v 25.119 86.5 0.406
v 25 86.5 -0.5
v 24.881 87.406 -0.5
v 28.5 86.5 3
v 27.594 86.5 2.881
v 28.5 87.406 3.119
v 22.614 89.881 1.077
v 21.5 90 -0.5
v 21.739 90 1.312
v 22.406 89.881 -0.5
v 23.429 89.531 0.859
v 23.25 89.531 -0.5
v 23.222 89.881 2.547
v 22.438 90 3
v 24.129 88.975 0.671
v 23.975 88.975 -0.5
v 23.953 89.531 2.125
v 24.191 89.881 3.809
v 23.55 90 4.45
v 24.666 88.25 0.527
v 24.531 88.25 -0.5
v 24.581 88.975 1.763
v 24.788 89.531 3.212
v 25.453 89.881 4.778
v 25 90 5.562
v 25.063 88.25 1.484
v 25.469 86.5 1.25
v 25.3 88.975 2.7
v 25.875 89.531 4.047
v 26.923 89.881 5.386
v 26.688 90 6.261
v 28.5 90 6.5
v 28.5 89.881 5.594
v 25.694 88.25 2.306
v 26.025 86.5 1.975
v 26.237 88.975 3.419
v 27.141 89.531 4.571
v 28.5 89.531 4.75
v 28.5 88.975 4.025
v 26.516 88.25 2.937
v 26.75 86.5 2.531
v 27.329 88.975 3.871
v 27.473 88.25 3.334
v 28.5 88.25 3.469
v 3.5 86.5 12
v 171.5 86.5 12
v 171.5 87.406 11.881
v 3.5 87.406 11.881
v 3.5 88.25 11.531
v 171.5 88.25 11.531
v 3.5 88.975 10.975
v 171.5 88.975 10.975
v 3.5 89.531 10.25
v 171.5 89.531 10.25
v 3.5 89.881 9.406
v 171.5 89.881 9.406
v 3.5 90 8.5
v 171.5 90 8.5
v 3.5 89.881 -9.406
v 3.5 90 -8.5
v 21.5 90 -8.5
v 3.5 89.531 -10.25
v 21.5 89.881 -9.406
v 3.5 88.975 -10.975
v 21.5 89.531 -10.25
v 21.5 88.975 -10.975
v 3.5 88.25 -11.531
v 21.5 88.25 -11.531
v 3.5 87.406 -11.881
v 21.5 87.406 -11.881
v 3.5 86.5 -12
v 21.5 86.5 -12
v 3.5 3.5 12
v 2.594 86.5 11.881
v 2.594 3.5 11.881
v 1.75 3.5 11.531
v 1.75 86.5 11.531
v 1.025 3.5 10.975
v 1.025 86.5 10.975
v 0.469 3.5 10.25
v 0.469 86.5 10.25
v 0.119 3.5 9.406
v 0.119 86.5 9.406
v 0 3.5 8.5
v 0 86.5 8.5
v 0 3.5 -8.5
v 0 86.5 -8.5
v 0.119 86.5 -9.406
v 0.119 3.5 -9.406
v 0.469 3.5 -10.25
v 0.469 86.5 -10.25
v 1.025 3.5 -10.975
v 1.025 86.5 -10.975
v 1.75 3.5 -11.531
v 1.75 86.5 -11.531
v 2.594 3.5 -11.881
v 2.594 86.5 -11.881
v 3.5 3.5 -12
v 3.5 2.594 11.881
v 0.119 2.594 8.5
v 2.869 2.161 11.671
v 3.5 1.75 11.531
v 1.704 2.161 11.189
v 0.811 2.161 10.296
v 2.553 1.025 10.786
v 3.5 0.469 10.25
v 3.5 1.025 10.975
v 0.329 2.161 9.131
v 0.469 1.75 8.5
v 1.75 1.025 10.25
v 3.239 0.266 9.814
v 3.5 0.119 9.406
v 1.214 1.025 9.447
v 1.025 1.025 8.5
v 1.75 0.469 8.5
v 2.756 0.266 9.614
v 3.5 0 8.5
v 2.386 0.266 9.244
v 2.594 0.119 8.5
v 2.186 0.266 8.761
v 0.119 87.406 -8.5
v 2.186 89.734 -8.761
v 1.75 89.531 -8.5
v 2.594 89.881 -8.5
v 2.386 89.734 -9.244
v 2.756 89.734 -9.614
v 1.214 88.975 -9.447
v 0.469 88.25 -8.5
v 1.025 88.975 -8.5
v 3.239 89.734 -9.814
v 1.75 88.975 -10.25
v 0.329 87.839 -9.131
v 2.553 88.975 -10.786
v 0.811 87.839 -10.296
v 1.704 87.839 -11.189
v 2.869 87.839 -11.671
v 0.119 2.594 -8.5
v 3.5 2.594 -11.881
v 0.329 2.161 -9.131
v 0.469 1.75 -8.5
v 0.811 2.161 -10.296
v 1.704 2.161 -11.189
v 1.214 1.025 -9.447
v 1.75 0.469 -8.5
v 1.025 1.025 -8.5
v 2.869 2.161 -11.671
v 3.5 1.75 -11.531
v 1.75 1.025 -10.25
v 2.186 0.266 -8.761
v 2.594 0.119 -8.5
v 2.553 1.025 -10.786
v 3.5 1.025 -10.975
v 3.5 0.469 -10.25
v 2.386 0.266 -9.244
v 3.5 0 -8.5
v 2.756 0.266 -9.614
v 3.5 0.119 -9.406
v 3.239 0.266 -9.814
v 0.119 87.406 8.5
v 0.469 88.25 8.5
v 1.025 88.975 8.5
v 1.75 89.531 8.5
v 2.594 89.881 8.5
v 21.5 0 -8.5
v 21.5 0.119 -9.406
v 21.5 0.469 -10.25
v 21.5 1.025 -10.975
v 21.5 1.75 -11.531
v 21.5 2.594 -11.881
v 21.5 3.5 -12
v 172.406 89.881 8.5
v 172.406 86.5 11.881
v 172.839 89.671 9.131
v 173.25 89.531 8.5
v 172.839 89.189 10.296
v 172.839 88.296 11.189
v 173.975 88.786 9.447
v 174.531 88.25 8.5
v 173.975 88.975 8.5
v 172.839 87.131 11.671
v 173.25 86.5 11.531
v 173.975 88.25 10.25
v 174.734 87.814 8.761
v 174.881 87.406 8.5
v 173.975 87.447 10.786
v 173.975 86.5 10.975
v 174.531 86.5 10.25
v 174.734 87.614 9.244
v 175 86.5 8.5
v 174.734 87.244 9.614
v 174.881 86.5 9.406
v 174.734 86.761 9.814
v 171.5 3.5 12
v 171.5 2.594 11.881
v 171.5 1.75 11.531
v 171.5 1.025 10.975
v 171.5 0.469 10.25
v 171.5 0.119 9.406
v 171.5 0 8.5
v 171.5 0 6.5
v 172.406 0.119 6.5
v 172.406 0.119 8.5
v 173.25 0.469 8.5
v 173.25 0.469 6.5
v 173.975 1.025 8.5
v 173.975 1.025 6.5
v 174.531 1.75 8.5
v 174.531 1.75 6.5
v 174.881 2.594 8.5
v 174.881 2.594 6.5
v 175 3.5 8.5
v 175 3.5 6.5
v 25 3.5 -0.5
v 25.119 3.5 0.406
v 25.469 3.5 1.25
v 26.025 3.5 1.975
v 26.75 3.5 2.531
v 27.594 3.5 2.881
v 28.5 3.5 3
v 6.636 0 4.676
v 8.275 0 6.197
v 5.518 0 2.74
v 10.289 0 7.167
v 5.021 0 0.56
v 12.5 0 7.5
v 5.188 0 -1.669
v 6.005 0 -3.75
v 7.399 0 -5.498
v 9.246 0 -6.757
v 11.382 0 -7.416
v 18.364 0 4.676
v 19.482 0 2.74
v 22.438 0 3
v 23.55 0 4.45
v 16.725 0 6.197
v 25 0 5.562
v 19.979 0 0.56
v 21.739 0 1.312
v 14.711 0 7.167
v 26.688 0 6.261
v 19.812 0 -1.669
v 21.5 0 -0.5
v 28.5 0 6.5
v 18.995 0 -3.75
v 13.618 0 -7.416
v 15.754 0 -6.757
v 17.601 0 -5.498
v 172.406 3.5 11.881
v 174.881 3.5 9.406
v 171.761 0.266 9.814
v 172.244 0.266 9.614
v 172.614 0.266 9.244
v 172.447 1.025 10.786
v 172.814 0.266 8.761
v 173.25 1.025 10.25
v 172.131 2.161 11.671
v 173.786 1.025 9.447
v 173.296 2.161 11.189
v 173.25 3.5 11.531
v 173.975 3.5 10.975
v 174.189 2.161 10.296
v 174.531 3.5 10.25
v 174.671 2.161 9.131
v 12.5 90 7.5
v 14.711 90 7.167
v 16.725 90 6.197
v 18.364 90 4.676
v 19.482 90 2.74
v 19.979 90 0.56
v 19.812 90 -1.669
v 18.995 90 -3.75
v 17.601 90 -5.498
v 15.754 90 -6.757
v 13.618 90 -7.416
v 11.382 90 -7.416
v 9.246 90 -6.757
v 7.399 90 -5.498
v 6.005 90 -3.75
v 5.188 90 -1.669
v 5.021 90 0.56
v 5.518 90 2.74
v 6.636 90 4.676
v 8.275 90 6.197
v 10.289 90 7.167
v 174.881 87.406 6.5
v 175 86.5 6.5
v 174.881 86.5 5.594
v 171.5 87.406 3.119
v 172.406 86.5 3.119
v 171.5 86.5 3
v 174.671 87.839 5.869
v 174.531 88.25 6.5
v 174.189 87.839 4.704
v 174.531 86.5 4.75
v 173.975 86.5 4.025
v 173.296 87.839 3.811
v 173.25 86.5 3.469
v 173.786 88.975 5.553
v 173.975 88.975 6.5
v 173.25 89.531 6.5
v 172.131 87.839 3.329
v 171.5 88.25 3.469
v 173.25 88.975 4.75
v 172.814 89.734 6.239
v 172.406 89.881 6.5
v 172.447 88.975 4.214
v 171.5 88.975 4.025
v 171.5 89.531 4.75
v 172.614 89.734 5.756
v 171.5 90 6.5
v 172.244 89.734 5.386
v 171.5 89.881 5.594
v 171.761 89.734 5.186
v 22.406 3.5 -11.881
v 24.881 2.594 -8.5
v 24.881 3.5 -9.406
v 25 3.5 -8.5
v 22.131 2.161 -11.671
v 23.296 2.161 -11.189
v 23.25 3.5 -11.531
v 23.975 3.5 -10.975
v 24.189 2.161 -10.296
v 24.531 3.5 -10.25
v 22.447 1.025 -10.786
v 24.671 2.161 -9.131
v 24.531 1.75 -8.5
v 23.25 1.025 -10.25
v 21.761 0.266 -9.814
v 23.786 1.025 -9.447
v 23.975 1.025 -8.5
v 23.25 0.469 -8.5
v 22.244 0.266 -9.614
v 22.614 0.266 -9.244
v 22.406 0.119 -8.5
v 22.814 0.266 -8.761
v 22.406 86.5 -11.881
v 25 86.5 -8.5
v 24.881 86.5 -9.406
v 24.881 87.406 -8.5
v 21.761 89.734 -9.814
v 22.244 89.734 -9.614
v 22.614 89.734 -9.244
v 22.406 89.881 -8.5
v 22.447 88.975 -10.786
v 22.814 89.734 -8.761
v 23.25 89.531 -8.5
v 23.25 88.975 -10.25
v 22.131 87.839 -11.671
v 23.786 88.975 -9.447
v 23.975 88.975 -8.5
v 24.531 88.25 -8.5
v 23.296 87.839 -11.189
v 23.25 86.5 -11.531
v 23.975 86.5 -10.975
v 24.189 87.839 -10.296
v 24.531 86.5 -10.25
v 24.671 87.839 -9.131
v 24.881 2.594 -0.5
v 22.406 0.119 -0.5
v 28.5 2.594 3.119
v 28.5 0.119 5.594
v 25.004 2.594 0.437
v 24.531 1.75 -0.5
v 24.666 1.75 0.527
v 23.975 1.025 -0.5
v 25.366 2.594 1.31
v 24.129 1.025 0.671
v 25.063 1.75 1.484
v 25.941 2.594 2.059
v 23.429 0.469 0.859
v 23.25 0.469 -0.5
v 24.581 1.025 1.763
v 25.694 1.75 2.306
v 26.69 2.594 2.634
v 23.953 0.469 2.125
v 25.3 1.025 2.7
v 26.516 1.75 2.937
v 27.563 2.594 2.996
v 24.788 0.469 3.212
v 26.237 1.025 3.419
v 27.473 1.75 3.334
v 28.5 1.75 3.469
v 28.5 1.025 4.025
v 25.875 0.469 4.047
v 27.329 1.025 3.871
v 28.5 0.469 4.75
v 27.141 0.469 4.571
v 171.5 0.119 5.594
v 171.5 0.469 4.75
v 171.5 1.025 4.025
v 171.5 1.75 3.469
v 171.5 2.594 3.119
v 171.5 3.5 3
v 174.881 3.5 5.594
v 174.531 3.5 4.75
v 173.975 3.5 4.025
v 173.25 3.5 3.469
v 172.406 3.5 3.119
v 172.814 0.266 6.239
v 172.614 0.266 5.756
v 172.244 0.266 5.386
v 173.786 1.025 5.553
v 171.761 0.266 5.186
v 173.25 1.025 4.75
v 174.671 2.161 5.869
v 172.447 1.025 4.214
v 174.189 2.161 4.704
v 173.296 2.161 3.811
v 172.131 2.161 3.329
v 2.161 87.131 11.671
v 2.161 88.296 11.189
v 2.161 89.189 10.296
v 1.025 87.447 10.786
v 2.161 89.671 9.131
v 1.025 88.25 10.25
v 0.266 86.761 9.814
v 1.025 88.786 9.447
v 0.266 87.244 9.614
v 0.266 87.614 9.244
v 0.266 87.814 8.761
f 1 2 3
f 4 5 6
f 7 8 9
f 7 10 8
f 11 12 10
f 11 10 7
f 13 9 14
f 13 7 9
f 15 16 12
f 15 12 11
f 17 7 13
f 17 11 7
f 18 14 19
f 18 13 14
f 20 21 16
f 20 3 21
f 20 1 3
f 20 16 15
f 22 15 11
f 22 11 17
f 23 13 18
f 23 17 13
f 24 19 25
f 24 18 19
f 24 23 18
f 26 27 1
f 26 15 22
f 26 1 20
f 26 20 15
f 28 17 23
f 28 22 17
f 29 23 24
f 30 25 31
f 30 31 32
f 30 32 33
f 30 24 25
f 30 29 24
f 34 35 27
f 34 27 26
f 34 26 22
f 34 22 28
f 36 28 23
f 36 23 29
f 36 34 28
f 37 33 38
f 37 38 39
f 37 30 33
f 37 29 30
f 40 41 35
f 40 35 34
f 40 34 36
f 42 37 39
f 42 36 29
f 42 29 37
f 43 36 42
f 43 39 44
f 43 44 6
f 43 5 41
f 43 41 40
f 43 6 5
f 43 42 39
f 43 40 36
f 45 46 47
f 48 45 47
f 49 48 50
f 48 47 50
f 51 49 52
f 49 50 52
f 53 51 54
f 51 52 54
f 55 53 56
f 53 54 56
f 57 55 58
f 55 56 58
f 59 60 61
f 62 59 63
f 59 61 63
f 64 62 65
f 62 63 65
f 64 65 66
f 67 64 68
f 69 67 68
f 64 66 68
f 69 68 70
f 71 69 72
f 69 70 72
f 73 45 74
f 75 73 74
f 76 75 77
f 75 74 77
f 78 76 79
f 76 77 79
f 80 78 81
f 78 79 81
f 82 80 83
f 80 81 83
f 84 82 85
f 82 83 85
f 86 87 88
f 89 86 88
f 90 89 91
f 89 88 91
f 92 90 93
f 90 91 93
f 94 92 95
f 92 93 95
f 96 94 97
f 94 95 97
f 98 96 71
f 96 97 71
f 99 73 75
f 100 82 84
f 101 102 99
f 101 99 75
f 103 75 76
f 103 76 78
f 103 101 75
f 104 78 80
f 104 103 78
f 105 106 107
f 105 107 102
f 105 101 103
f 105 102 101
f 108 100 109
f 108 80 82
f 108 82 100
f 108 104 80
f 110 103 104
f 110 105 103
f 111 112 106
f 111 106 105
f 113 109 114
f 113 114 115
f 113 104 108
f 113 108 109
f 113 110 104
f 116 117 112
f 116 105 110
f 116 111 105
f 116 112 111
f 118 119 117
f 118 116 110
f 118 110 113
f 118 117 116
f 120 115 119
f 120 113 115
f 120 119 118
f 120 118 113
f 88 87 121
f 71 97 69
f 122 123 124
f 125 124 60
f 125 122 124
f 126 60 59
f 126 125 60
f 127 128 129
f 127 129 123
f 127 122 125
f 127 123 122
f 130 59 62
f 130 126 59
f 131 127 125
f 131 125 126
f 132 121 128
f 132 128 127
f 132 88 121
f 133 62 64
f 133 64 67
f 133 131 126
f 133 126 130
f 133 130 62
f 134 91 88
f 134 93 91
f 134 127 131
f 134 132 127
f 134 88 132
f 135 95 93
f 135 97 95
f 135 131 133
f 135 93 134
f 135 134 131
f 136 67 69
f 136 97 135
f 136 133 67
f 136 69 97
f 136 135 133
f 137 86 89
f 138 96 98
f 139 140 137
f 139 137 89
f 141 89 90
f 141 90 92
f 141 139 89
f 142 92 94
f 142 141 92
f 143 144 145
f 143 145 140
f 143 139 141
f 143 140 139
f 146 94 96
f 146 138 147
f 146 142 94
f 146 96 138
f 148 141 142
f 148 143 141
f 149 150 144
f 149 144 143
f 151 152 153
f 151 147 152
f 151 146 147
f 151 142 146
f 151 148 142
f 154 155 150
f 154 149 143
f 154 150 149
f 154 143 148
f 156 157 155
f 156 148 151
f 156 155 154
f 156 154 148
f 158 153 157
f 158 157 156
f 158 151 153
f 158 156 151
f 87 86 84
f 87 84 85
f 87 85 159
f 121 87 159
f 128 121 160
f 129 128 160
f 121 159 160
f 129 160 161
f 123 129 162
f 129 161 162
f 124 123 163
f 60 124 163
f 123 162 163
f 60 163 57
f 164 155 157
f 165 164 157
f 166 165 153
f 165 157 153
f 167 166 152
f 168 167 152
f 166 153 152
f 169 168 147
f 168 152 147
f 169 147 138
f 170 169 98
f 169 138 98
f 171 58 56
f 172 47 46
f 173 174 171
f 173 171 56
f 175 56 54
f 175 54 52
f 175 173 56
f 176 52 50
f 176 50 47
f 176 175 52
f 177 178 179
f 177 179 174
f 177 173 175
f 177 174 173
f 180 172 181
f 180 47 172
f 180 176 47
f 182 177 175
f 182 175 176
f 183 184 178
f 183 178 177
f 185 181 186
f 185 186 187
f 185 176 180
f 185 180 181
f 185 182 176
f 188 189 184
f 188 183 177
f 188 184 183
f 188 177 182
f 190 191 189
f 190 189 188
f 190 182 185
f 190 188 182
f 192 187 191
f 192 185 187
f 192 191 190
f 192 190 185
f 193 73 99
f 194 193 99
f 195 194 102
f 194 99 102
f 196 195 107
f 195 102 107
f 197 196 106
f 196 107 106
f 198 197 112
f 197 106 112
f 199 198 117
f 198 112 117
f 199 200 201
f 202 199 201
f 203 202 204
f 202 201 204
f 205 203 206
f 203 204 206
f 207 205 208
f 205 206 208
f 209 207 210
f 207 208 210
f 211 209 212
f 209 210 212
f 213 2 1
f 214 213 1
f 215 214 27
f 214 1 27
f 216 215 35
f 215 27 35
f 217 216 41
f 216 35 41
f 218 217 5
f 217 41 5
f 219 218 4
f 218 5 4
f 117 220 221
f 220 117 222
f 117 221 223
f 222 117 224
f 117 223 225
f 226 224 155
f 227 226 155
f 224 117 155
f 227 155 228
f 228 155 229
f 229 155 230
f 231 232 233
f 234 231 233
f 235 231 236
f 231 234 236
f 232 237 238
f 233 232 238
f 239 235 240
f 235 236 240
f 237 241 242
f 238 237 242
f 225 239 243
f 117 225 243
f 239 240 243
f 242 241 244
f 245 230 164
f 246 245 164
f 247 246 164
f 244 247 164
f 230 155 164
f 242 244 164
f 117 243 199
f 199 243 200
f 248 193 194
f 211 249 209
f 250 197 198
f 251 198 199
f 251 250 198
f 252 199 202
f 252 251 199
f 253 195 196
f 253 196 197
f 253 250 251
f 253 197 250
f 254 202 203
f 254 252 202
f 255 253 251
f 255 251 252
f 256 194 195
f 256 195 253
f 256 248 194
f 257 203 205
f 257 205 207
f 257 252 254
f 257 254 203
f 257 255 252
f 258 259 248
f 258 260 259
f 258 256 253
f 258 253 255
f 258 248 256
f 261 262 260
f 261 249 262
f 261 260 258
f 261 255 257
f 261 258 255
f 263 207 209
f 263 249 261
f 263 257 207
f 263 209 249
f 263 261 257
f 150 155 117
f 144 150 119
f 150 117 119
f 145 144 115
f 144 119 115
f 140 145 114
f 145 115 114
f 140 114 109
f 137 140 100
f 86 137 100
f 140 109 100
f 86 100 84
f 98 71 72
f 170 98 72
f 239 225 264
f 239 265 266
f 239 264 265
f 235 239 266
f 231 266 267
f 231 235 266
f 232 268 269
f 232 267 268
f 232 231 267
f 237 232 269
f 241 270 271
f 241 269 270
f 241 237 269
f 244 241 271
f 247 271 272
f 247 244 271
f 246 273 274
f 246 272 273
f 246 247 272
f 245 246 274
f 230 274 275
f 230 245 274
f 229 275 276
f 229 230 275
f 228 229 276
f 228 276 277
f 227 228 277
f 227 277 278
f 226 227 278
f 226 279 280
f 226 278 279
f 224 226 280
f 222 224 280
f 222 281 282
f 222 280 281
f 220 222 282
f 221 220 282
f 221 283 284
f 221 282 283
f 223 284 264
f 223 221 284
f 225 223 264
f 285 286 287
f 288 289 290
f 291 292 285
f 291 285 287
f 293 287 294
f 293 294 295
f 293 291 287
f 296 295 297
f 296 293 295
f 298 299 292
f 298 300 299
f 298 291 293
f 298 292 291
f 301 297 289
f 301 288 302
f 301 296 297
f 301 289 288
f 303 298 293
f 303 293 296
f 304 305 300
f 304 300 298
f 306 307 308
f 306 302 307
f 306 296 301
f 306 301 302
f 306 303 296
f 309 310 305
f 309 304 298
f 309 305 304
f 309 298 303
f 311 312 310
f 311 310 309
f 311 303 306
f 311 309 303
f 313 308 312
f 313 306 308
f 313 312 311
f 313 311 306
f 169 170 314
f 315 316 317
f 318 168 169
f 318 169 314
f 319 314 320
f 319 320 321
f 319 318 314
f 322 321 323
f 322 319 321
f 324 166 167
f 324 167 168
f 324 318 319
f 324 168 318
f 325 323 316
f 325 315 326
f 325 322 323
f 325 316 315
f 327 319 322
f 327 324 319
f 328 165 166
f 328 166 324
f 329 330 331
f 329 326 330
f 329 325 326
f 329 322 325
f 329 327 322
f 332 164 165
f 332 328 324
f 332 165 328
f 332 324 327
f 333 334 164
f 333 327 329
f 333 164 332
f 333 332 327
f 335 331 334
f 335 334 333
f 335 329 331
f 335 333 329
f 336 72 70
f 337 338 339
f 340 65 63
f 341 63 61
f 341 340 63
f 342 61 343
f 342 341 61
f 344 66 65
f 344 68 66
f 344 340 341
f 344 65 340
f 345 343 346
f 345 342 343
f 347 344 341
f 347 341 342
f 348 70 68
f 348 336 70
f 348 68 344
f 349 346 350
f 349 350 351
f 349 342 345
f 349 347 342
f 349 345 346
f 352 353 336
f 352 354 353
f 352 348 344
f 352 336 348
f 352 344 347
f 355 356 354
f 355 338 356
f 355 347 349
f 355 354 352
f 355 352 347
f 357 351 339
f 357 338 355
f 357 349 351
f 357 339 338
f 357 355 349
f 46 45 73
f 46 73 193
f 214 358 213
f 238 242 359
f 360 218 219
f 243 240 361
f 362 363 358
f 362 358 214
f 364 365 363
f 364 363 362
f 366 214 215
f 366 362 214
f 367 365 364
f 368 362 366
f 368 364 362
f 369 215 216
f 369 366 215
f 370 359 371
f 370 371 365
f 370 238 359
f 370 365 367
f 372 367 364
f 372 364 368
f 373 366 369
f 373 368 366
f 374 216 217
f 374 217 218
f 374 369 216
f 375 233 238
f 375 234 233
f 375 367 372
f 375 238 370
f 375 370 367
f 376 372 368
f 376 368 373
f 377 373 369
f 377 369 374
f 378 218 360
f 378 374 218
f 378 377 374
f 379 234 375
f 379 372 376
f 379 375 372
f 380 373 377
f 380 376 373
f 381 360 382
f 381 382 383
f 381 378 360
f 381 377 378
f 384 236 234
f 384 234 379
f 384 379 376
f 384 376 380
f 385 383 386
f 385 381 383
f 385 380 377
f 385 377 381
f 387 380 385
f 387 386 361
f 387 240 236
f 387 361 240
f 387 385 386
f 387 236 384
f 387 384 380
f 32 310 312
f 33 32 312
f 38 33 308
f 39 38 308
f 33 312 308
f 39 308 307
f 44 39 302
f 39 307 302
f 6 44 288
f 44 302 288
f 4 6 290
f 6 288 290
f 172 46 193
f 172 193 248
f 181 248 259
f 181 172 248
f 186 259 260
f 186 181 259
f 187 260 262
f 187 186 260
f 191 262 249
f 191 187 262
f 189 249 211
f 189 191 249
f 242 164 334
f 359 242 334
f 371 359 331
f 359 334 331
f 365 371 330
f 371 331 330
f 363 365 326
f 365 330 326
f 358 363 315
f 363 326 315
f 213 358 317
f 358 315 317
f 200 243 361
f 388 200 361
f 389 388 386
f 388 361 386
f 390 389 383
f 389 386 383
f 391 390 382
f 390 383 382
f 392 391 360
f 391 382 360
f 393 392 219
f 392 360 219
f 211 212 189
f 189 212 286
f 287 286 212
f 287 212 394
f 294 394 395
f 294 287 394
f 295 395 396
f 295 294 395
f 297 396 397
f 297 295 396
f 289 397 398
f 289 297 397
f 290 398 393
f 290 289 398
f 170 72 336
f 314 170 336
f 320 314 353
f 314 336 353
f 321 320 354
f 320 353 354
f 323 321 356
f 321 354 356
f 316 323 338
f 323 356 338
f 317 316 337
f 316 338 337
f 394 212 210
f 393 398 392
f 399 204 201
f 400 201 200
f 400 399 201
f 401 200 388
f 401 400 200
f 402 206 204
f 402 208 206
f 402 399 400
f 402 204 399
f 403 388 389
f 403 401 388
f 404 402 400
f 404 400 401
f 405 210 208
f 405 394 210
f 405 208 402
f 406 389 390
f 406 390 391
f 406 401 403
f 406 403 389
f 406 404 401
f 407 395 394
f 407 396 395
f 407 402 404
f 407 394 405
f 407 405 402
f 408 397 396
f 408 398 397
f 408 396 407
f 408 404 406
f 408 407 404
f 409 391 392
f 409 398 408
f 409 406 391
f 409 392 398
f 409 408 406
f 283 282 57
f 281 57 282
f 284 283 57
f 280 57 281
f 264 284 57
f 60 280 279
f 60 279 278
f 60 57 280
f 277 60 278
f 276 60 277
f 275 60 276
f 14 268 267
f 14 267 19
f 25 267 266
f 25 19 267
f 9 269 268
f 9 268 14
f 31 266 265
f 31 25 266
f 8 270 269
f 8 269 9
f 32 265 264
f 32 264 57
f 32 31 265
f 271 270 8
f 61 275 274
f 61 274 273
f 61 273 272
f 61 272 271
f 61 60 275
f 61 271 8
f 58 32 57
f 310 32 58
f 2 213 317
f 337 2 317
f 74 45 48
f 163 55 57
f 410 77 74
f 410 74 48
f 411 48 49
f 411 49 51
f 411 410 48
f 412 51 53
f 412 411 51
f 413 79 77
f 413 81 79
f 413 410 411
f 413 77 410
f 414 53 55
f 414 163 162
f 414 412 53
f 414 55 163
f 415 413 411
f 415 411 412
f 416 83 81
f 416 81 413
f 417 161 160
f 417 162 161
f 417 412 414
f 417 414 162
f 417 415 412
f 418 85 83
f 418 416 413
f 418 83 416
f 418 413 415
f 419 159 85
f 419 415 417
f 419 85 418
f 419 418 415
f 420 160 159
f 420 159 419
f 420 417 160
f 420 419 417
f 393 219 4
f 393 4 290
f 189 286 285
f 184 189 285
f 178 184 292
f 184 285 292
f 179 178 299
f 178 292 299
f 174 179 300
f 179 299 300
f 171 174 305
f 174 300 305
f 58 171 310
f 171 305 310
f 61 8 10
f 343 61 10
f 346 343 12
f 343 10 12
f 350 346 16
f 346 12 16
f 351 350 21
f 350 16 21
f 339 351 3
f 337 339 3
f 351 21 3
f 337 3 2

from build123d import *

# Parameters (mm, degrees)
RESSALTO_EXTRUS_O1_DEPTH      = 12
RESSALTO_EXTRUS_O1_DEPTH_BACK = 12
ESBO_O1_W                     = 175
ESBO_O1_H                     = 90
CORTE_EXTRUS_O1_DEPTH         = 198.15222545
CORTE_EXTRUS_O1_DEPTH_BACK    = 198.15222545
ESBO_O3_W                     = 150
ESBO_O3_H                     = 15
CORTE_EXTRUS_O2_DEPTH         = 198.15222545
CORTE_EXTRUS_O2_DEPTH_BACK    = 198.15222545
ESBO_O4_R                     = 7.5
FILETE1_R                     = 3.5
FILETE2_R                     = 3.5
FILETE3_R                     = 3.5


with BuildPart() as part:
    # Esboço1 → Ressalto-extrusão1 (new, two sides: drawn at the far end of the back side and taken through both)
    with BuildSketch(Plane.XY.offset(-RESSALTO_EXTRUS_O1_DEPTH_BACK)):
        with Locations((87.5, 45)):
            Rectangle(ESBO_O1_W, ESBO_O1_H)
    extrude(amount=RESSALTO_EXTRUS_O1_DEPTH + RESSALTO_EXTRUS_O1_DEPTH_BACK)

    # Esboço3 → Corte-extrusão1 (cut, two sides: drawn at the far end of the back side and taken through both)
    with BuildSketch(Plane(origin=(0, 0, 0), x_dir=(1, 0, 0), z_dir=(0, 1, 0)).offset(-CORTE_EXTRUS_O1_DEPTH_BACK)):
        with Locations((100, 4.5)):
            Rectangle(ESBO_O3_W, ESBO_O3_H)
    extrude(amount=CORTE_EXTRUS_O1_DEPTH + CORTE_EXTRUS_O1_DEPTH_BACK, mode=Mode.SUBTRACT)

    # Esboço4 → Corte-extrusão2 (cut, two sides: drawn at the far end of the back side and taken through both)
    with BuildSketch(Plane(origin=(0, 90, 0), x_dir=(1, 0, 0), z_dir=(0, 1, 0)).offset(-CORTE_EXTRUS_O2_DEPTH_BACK)):
        with Locations(Location((12.5, 0, 0), (0, 0, 270))):
            Circle(ESBO_O4_R)
    extrude(amount=CORTE_EXTRUS_O2_DEPTH + CORTE_EXTRUS_O2_DEPTH_BACK, mode=Mode.SUBTRACT)

    # Filete1
    filete1_edges = [part.edges().sort_by_distance(p)[0] for p in [
        (25, 45, -12),
        (25, 45, 3),
        (0, 45, -12),
    ]]
    fillet(filete1_edges, radius=FILETE1_R)

    # Filete2
    filete2_edges = [part.edges().sort_by_distance(p)[0] for p in [
        (175, 45, 12),
        (87.5, 90, 12),
        (175, 45, 3),
    ]]
    fillet(filete2_edges, radius=FILETE2_R)

    # Filete3
    # the kernel refuses this fillet: 3.5 mm, written as the material it takes off along each edge
    with BuildSketch(Plane(origin=(171.5, 86.5, 8.5), x_dir=(0, 1, 0), z_dir=(1, 0, 0))) as filete3_piece_1_section:
        Polygon((0, 0), (FILETE3_R, 0), (FILETE3_R, FILETE3_R), (0, FILETE3_R), align=None)
    filete3_piece_1 = extrude(amount=FILETE3_R, mode=Mode.PRIVATE)
    filete3_piece_1 = filete3_piece_1 - Plane(origin=(171.5, 86.5, 8.5), x_dir=(0, -0.7071067811865475, -0.7071067811865475), z_dir=(1, 0, 0)) * Sphere(FILETE3_R, mode=Mode.PRIVATE)
    add(filete3_piece_1, mode=Mode.SUBTRACT)
    with BuildSketch(Plane(origin=(3.5, 3.5, 8.5), x_dir=(0, 0, 1), z_dir=(0, -1, 0))) as filete3_piece_2_section:
        Polygon((0, 0), (FILETE3_R, 0), (FILETE3_R, FILETE3_R), (0, FILETE3_R), align=None)
    filete3_piece_2 = extrude(amount=FILETE3_R, mode=Mode.PRIVATE)
    filete3_piece_2 = filete3_piece_2 - Plane(origin=(3.5, 3.5, 8.5), x_dir=(0.7071067811865475, 0, -0.7071067811865475), z_dir=(0, -1, 0)) * Sphere(FILETE3_R, mode=Mode.PRIVATE)
    add(filete3_piece_2, mode=Mode.SUBTRACT)
    with BuildSketch(Plane(origin=(3.5, 0, 12), x_dir=(0, 0, -1), z_dir=(1, 0, 0))) as filete3_piece_3:
        with BuildLine():
            CenterArc((FILETE3_R, FILETE3_R), FILETE3_R, 180, 90)
            Line((0, FILETE3_R), (0, 0))
            Line((0, 0), (FILETE3_R, 0))
        make_face()
    extrude(amount=168, mode=Mode.SUBTRACT)
    with BuildSketch(Plane(origin=(0, 0, 8.5), x_dir=(1, 0, 0), z_dir=(0, 0, -1)), Plane(origin=(0, 90, 8.5), x_dir=(0, -1, 0), z_dir=(0, 0, -1))) as filete3_piece_4:
        with BuildLine():
            CenterArc((FILETE3_R, -FILETE3_R), FILETE3_R, 90, 90)
            Line((0, -FILETE3_R), (0, 0))
            Line((0, 0), (FILETE3_R, 0))
        make_face()
    extrude(amount=17, mode=Mode.SUBTRACT)
    with BuildSketch(Plane(origin=(25, 0, -8.5), x_dir=(-1, 0, 0), z_dir=(0, 0, 1))) as filete3_piece_5:
        with BuildLine():
            CenterArc((FILETE3_R, -FILETE3_R), FILETE3_R, 90, 90)
            Line((0, -FILETE3_R), (0, 0))
            Line((0, 0), (FILETE3_R, 0))
        make_face()
    extrude(amount=8, mode=Mode.SUBTRACT)
    with BuildSketch(Plane(origin=(3.5, 0, -12), x_dir=(0, 0, 1), z_dir=(1, 0, 0))) as filete3_piece_6:
        with BuildLine():
            CenterArc((FILETE3_R, -FILETE3_R), FILETE3_R, 90, 90)
            Line((0, -FILETE3_R), (0, 0))
            Line((0, 0), (FILETE3_R, 0))
        make_face()
    extrude(amount=18, mode=Mode.SUBTRACT)
    with BuildSketch(Plane(origin=(21.5, 0, -8.5), x_dir=(0, 0, -1), z_dir=(-1, 0, 0))) as filete3_piece_7:
        with BuildLine():
            CenterArc((3.5 - FILETE3_R, -FILETE3_R), FILETE3_R, 0, 90)
            Line((3.5, -FILETE3_R), (3.5, 0))
            Line((3.5, 0), (3.5 - FILETE3_R, 0))
        make_face()
    revolve(axis=Axis((21.5, 0, -8.5), (0, -1, 0)), revolution_arc=90, mode=Mode.SUBTRACT)
    with BuildSketch(Plane(origin=(3.5, 0, -8.5), x_dir=(-1, 0, 0), z_dir=(0, 0, 1))) as filete3_piece_8:
        with BuildLine():
            CenterArc((3.5 - FILETE3_R, -FILETE3_R), FILETE3_R, 0, 90)
            Line((3.5, -FILETE3_R), (3.5, 0))
            Line((3.5, 0), (3.5 - FILETE3_R, 0))
        make_face()
    revolve(axis=Axis((3.5, 0, -8.5), (0, -1, 0)), revolution_arc=90, mode=Mode.SUBTRACT)
    with BuildSketch(Plane(origin=(21.5, 90, -12), x_dir=(0, -1, 0), z_dir=(-1, 0, 0))) as filete3_piece_9:
        with BuildLine():
            CenterArc((FILETE3_R, FILETE3_R), FILETE3_R, 180, 90)
            Line((0, FILETE3_R), (0, 0))
            Line((0, 0), (FILETE3_R, 0))
        make_face()
    extrude(amount=18, mode=Mode.SUBTRACT)
    with BuildSketch(Plane(origin=(25, 90, -0.5), x_dir=(0, -1, 0), z_dir=(0, 0, -1))) as filete3_piece_10:
        with BuildLine():
            CenterArc((FILETE3_R, FILETE3_R), FILETE3_R, 180, 90)
            Line((0, FILETE3_R), (0, 0))
            Line((0, 0), (FILETE3_R, 0))
        make_face()
    extrude(amount=8, mode=Mode.SUBTRACT)
    with BuildSketch(Plane(origin=(171.5, 90, 3), x_dir=(0, -1, 0), z_dir=(-1, 0, 0))) as filete3_piece_11:
        with BuildLine():
            CenterArc((FILETE3_R, FILETE3_R), FILETE3_R, 180, 90)
            Line((0, FILETE3_R), (0, 0))
            Line((0, 0), (FILETE3_R, 0))
        make_face()
    extrude(amount=143, mode=Mode.SUBTRACT)
    with BuildSketch(Plane(origin=(21.5, 90, -8.5), x_dir=(0, 0, -1), z_dir=(-1, 0, 0))) as filete3_piece_12:
        with BuildLine():
            CenterArc((3.5 - FILETE3_R, FILETE3_R), FILETE3_R, 270, 90)
            Line((3.5 - FILETE3_R, 0), (3.5, 0))
            Line((3.5, 0), (3.5, FILETE3_R))
        make_face()
    revolve(axis=Axis((21.5, 90, -8.5), (0, -1, 0)), revolution_arc=90, mode=Mode.SUBTRACT)
    with BuildSketch(Plane(origin=(3.5, 90, -8.5), x_dir=(-1, 0, 0), z_dir=(0, 0, 1))) as filete3_piece_13:
        with BuildLine():
            CenterArc((3.5 - FILETE3_R, FILETE3_R), FILETE3_R, 270, 90)
            Line((3.5 - FILETE3_R, 0), (3.5, 0))
            Line((3.5, 0), (3.5, FILETE3_R))
        make_face()
    revolve(axis=Axis((3.5, 90, -8.5), (0, -1, 0)), revolution_arc=90, mode=Mode.SUBTRACT)
    with BuildSketch(Plane(origin=(28.5, 90, -0.5), x_dir=(-1, 0, 0), z_dir=(0, 0, -1))) as filete3_piece_14:
        with BuildLine():
            CenterArc((3.5 + FILETE3_R, -FILETE3_R), FILETE3_R, 90, 90)
            Line((3.5 + FILETE3_R, 0), (3.5, 0))
            Line((3.5, 0), (3.5, -FILETE3_R))
        make_face()
    revolve(axis=Axis((28.5, 90, -0.5), (0, 1, 0)), revolution_arc=90, mode=Mode.SUBTRACT)
    with BuildSketch(Plane(origin=(28.5, 0, -0.5), x_dir=(-1, 0, 0), z_dir=(0, 0, -1))) as filete3_piece_15:
        with BuildLine():
            CenterArc((3.5 + FILETE3_R, FILETE3_R), FILETE3_R, 180, 90)
            Line((3.5, FILETE3_R), (3.5, 0))
            Line((3.5, 0), (3.5 + FILETE3_R, 0))
        make_face()
    revolve(axis=Axis((28.5, 0, -0.5), (0, 1, 0)), revolution_arc=90, mode=Mode.SUBTRACT)
    with BuildSketch(Plane(origin=(0, 86.5, 12), x_dir=(1, 0, 0), z_dir=(0, -1, 0))) as filete3_piece_16:
        with BuildLine():
            CenterArc((FILETE3_R, -FILETE3_R), FILETE3_R, 90, 90)
            Line((0, -FILETE3_R), (0, 0))
            Line((0, 0), (FILETE3_R, 0))
        make_face()
    extrude(amount=83, mode=Mode.SUBTRACT)
    with BuildSketch(Plane(origin=(0, 86.5, 8.5), x_dir=(0, 0, 1), z_dir=(0, -1, 0))) as filete3_piece_17:
        with BuildLine():
            CenterArc((3.5 - FILETE3_R, -FILETE3_R), FILETE3_R, 0, 90)
            Line((3.5, -FILETE3_R), (3.5, 0))
            Line((3.5, 0), (3.5 - FILETE3_R, 0))
        make_face()
    revolve(axis=Axis((0, 86.5, 8.5), (-1, 0, 0)), revolution_arc=90, mode=Mode.SUBTRACT)
    with BuildSketch(Plane(origin=(175, 90, 6.5), x_dir=(0, -1, 0), z_dir=(0, 0, 1)), Plane(origin=(175, 0, 6.5), x_dir=(-1, 0, 0), z_dir=(0, 0, 1))) as filete3_piece_18:
        with BuildLine():
            CenterArc((FILETE3_R, -FILETE3_R), FILETE3_R, 90, 90)
            Line((0, -FILETE3_R), (0, 0))
            Line((0, 0), (FILETE3_R, 0))
        make_face()
    extrude(amount=2, mode=Mode.SUBTRACT)
    with BuildSketch(Plane(origin=(171.5, 90, 6.5), x_dir=(1, 0, 0), z_dir=(0, 0, 1))) as filete3_piece_19:
        with BuildLine():
            CenterArc((3.5 - FILETE3_R, -FILETE3_R), FILETE3_R, 0, 90)
            Line((3.5 - FILETE3_R, 0), (3.5, 0))
            Line((3.5, 0), (3.5, -FILETE3_R))
        make_face()
    revolve(axis=Axis((171.5, 90, 6.5), (0, 1, 0)), revolution_arc=90, mode=Mode.SUBTRACT)
    with BuildSketch(Plane(origin=(28.5, 0, 3), x_dir=(0, 0, 1), z_dir=(1, 0, 0))) as filete3_piece_20:
        with BuildLine():
            CenterArc((FILETE3_R, -FILETE3_R), FILETE3_R, 90, 90)
            Line((0, -FILETE3_R), (0, 0))
            Line((0, 0), (FILETE3_R, 0))
        make_face()
    extrude(amount=143, mode=Mode.SUBTRACT)
    with BuildSketch(Plane(origin=(171.5, 0, 6.5), x_dir=(1, 0, 0), z_dir=(0, 0, 1))) as filete3_piece_21:
        with BuildLine():
            CenterArc((3.5 - FILETE3_R, FILETE3_R), FILETE3_R, 270, 90)
            Line((3.5, FILETE3_R), (3.5, 0))
            Line((3.5, 0), (3.5 - FILETE3_R, 0))
        make_face()
    revolve(axis=Axis((171.5, 0, 6.5), (0, 1, 0)), revolution_arc=90, mode=Mode.SUBTRACT)
    with BuildSketch(Plane(origin=(171.5, 0, 8.5), x_dir=(0, 0, 1), z_dir=(-1, 0, 0))) as filete3_piece_22:
        with BuildLine():
            CenterArc((3.5 - FILETE3_R, FILETE3_R), FILETE3_R, 270, 90)
            Line((3.5, FILETE3_R), (3.5, 0))
            Line((3.5, 0), (3.5 - FILETE3_R, 0))
        make_face()
    revolve(axis=Axis((171.5, 0, 8.5), (0, 1, 0)), revolution_arc=90, mode=Mode.SUBTRACT)


solid = part.part
